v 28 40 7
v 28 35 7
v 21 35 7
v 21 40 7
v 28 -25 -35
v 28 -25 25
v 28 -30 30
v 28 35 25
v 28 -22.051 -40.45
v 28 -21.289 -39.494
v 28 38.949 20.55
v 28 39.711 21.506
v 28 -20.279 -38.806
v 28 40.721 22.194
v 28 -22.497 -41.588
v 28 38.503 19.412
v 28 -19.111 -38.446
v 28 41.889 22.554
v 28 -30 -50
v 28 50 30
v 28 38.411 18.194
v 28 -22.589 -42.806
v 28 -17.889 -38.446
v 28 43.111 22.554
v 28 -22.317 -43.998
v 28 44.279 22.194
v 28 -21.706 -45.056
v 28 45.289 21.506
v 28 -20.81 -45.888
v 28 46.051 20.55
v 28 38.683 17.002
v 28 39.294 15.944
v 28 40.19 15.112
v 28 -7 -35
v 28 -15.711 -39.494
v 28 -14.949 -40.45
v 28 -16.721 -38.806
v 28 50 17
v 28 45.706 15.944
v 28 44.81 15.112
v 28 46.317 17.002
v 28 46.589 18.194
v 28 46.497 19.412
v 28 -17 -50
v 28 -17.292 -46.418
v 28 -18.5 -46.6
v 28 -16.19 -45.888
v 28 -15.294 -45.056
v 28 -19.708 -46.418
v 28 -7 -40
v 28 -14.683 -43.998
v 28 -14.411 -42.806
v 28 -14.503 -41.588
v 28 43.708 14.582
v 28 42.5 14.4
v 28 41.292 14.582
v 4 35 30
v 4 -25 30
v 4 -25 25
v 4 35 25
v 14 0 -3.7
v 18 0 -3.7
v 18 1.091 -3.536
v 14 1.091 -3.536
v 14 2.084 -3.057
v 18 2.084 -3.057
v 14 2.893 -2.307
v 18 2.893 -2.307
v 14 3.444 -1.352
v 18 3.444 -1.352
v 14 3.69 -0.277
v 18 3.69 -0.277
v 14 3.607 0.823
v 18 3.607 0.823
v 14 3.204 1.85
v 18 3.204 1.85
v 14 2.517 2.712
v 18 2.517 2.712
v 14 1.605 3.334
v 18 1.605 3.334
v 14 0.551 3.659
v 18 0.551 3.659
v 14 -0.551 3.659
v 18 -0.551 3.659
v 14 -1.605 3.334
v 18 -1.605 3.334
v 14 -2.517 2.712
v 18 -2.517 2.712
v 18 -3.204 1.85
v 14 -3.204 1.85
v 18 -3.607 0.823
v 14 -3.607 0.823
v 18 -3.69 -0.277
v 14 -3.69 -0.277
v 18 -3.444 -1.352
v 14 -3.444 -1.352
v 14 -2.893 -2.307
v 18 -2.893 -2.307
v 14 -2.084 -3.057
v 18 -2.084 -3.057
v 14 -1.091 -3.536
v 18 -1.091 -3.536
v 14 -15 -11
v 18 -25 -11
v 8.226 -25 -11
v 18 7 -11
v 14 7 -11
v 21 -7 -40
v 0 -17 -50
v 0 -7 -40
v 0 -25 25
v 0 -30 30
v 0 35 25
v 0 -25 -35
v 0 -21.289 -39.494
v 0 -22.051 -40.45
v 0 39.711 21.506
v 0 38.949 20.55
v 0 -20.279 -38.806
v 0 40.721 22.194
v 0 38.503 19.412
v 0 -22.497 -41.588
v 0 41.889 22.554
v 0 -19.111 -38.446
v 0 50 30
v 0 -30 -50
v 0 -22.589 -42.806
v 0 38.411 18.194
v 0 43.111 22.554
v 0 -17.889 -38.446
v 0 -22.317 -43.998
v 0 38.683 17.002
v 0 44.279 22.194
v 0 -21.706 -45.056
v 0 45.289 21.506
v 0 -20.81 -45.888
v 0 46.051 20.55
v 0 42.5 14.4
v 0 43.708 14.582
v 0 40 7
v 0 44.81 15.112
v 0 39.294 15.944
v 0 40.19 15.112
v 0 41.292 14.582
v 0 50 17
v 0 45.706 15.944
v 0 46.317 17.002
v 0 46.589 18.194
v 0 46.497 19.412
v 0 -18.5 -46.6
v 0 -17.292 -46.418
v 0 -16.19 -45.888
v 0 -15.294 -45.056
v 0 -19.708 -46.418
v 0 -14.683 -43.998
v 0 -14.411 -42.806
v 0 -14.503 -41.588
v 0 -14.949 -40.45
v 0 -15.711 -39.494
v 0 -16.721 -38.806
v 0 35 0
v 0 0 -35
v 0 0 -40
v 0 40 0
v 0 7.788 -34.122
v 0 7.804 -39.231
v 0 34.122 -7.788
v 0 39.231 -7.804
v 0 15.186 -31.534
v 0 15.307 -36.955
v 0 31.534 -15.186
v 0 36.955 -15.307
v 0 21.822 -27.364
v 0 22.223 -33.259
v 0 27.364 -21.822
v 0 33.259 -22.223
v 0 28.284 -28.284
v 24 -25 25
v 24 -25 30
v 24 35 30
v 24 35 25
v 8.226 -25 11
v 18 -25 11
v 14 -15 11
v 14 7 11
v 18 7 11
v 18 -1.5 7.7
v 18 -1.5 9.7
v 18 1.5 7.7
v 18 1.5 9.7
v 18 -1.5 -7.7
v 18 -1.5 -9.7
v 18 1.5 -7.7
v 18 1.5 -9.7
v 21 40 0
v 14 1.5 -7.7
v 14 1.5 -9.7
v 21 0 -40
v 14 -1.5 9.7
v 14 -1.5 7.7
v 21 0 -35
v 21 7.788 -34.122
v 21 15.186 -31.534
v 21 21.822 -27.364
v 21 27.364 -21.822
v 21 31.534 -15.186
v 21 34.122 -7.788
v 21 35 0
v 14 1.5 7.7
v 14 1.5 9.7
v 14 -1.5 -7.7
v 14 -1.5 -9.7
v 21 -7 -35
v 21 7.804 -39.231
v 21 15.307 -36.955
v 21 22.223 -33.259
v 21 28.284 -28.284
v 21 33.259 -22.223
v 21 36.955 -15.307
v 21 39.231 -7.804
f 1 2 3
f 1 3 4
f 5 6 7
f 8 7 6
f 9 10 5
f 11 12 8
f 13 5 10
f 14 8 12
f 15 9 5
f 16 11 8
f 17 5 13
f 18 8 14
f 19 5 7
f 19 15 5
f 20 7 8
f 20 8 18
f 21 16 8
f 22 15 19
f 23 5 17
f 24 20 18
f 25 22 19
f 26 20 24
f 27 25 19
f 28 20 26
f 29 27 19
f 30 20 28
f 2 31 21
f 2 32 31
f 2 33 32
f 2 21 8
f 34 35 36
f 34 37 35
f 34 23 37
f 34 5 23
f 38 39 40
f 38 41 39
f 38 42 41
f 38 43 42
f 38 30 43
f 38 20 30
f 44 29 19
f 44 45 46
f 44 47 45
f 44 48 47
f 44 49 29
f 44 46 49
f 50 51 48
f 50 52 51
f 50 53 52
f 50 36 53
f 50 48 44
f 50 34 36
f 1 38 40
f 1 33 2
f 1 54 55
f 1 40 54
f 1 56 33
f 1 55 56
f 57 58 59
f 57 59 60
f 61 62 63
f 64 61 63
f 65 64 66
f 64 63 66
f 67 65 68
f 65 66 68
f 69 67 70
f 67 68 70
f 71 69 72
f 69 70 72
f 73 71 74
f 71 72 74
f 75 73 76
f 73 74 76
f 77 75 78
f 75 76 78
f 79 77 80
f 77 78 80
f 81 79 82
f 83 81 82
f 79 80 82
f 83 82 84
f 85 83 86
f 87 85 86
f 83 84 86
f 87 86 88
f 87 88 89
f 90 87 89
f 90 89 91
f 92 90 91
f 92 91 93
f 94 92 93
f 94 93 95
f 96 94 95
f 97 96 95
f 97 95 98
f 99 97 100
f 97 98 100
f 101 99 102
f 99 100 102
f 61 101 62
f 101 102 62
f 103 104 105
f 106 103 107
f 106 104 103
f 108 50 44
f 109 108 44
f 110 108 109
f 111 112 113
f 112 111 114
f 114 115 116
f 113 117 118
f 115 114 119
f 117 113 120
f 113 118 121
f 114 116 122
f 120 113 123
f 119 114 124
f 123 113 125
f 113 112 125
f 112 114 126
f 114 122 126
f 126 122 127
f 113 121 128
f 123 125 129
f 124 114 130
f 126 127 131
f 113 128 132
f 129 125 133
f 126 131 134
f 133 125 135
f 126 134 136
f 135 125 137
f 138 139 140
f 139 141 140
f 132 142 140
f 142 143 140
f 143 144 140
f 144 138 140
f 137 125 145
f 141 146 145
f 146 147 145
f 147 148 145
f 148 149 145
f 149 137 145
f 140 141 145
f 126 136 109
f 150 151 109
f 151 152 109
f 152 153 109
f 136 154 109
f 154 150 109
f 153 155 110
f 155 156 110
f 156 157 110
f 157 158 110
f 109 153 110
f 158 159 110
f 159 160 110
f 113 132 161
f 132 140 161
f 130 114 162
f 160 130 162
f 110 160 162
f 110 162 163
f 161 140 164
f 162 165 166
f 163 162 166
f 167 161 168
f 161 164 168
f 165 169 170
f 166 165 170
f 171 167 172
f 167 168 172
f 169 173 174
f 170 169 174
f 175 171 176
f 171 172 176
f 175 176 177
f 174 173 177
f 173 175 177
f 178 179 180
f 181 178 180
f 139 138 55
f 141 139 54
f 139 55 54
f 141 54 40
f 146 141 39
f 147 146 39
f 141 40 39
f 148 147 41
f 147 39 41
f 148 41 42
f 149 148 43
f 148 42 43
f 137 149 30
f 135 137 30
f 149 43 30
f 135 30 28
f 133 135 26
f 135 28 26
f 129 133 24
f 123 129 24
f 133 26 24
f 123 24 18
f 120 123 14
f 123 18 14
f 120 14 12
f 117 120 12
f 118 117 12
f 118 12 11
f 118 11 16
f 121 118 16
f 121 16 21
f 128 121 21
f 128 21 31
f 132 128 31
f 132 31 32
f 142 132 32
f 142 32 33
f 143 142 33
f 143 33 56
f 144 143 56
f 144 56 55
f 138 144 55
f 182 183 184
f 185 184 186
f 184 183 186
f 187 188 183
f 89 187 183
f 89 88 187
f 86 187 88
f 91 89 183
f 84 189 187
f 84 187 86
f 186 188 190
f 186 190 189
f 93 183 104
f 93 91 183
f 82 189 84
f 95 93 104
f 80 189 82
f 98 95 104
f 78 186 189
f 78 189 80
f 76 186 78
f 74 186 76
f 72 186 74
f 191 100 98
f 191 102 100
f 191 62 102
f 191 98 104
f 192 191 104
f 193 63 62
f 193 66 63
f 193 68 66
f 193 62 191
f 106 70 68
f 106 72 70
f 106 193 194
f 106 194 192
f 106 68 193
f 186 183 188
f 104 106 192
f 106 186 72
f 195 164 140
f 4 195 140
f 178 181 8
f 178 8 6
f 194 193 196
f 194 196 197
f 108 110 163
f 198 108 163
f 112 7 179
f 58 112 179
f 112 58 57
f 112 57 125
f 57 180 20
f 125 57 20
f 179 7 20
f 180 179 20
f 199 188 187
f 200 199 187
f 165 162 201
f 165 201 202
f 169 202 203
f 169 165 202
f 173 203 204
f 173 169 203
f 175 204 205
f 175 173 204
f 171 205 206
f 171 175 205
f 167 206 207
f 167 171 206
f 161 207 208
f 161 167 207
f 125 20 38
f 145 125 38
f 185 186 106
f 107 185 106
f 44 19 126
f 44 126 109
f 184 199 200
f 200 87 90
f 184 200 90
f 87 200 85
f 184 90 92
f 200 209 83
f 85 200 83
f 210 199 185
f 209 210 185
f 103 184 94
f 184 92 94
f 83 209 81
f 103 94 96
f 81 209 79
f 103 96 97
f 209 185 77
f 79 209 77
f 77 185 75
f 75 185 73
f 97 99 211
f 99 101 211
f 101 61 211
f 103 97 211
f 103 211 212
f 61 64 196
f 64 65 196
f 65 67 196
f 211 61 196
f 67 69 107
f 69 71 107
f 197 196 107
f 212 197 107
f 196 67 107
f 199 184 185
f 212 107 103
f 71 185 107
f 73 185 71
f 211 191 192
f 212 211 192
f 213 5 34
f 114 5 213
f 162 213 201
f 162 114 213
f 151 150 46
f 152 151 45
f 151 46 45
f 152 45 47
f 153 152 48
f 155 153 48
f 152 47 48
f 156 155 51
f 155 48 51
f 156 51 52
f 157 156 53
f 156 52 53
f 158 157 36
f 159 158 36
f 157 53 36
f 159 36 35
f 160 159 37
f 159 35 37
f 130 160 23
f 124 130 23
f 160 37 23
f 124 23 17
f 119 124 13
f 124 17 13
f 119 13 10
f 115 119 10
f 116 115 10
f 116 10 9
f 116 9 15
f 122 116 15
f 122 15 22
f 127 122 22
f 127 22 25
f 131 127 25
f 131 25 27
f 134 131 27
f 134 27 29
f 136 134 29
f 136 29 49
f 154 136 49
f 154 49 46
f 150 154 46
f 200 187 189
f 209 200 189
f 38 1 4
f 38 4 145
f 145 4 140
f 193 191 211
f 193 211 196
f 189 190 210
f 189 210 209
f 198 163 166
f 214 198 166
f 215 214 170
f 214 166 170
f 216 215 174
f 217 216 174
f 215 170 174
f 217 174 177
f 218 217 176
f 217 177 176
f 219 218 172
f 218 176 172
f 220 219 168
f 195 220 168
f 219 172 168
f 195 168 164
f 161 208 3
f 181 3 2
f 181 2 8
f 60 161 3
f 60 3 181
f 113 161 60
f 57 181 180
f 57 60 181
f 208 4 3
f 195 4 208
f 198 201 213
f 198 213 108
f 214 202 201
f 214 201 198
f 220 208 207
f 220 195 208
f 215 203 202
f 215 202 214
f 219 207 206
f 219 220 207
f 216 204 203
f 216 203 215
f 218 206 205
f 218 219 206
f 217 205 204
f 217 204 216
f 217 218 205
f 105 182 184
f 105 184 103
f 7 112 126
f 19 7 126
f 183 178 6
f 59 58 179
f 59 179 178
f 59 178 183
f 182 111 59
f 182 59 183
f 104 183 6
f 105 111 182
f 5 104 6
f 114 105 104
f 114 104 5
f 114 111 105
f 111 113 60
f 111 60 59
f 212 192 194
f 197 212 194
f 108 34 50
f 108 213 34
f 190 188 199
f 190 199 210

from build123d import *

# Parameters (mm, degrees)
BOSS_EXTRUDE1_DEPTH = 28
BOSS_EXTRUDE2_START = -10
SKETCH3_W           = 22
SKETCH3_H           = 32
SKETCH3_R           = 3.7
SKETCH3_W_2         = 2
SKETCH3_H_2         = 3
BOSS_EXTRUDE2_DEPTH = 4
CUT_EXTRUDE1_START  = -7
CUT_EXTRUDE1_DEPTH  = 7
CHAMFER1_SIZE       = 10
CHAMFER1_SIZE2      = 5.773502692
CUT_EXTRUDE2_REACH  = 87.346
SKETCH5_W           = 20
SKETCH5_H           = 60
SKETCH6_W           = 23
SKETCH6_H           = 10
SKETCH6_W_2         = 10
SKETCH6_H_2         = 23
BOSS_EXTRUDE3_DEPTH = 28
SKETCH8_R           = 4.1
CUT_EXTRUDE3_DEPTH  = 77.052613367
CHAMFER2_SIZE       = 10


with BuildPart() as part:
    # Sketch2 → Boss-Extrude1 (new body)
    with BuildSketch(Plane(origin=(0, 0, 0), x_dir=(0, 0, -1), z_dir=(1, 0, 0))):
        with BuildLine():
            Line((0, 40), (-30, 40))
            Line((-30, 40), (-30, -30))
            Line((-30, -30), (40, -30))
            Line((40, -30), (40, 0))
            ThreePointArc((40, 0), (28.284271247, 28.284271247), (0, 40))
        make_face()
        with BuildLine():
            Line((-25, 35), (-25, -25))
            Line((-25, -25), (35, -25))
            Line((35, -25), (35, 0))
            ThreePointArc((35, 0), (24.748737342, 24.748737342), (0, 35))
            Line((0, 35), (-25, 35))
        make_face(mode=Mode.SUBTRACT)
    extrude(amount=BOSS_EXTRUDE1_DEPTH)

    # Sketch3 → Boss-Extrude2 (add)
    with BuildSketch(Plane(origin=(28, 0, 0), x_dir=(0, 0, -1), z_dir=(1, 0, 0)).offset(BOSS_EXTRUDE2_START)):
        with Locations((0, -9)):
            Rectangle(SKETCH3_W, SKETCH3_H)
        Circle(SKETCH3_R, mode=Mode.SUBTRACT)
        with Locations((-8.7, 0)):
            Rectangle(SKETCH3_W_2, SKETCH3_H_2, mode=Mode.SUBTRACT)
        with Locations((8.7, 0)):
            Rectangle(SKETCH3_W_2, SKETCH3_H_2, mode=Mode.SUBTRACT)
    extrude(amount=-BOSS_EXTRUDE2_DEPTH)

    # Sketch4 → Cut-Extrude1 (cut)
    with BuildSketch(Plane(origin=(28, 0, 0), x_dir=(0, 0, -1), z_dir=(1, 0, 0)).offset(CUT_EXTRUDE1_START)):
        with BuildLine():
            Line((0, 40), (-7, 40))
            Line((-7, 40), (-7, 35))
            Line((-7, 35), (0, 35))
            ThreePointArc((0, 35), (24.748737342, 24.748737342), (35, 0))
            Line((35, 0), (35, -7))
            Line((35, -7), (40, -7))
            Line((40, -7), (40, 0))
            ThreePointArc((40, 0), (28.284271247, 28.284271247), (0, 40))
        make_face()
    extrude(amount=CUT_EXTRUDE1_DEPTH, mode=Mode.SUBTRACT)

    # Chamfer1
    chamfer1_edges = [part.edges().sort_by_distance(p)[0] for p in [
        (14, -25, 0),
    ]]
    chamfer1_side = [part.faces().sort_by_distance(p)[0] for p in [
        (14, -9.762838276, 0),
    ]]
    chamfer(chamfer1_edges, length=CHAMFER1_SIZE, length2=CHAMFER1_SIZE2, reference=chamfer1_side[0])

    # Sketch5 → Cut-Extrude2 (cut, up to next)
    with BuildSketch(Plane.XY.offset(30), mode=Mode.PRIVATE) as cut_extrude2_sk1:
        with Locations((14, 5)):
            Rectangle(SKETCH5_W, SKETCH5_H)
    cut_extrude2_tool1 = extrude(cut_extrude2_sk1.sketch, amount=-CUT_EXTRUDE2_REACH, mode=Mode.PRIVATE) & part.part
    add(cut_extrude2_tool1.solids().sort_by_distance((14, 5, 30))[0], mode=Mode.SUBTRACT)

    # Sketch6 → Boss-Extrude3 (add)
    with BuildSketch(Plane(origin=(28, 0, 0), x_dir=(0, 0, -1), z_dir=(1, 0, 0))):
        with Locations((-18.5, 45)):
            Rectangle(SKETCH6_W, SKETCH6_H)
        with Locations((45, -18.5)):
            Rectangle(SKETCH6_W_2, SKETCH6_H_2)
    extrude(amount=-BOSS_EXTRUDE3_DEPTH)

    # Sketch8 → Cut-Extrude3 (cut, through all)
    with BuildSketch(Plane(origin=(28, 0, 0), x_dir=(0, 0, -1), z_dir=(1, 0, 0))):
        with Locations((-18.5, 42.5)):
            Circle(SKETCH8_R)
        with Locations((42.5, -18.5)):
            Circle(SKETCH8_R)
    extrude(amount=-CUT_EXTRUDE3_DEPTH, mode=Mode.SUBTRACT)

    # Chamfer2
    chamfer2_edges = [part.edges().sort_by_distance(p)[0] for p in [
        (14, -7, -50),
        (14, 50, 7),
    ]]
    chamfer(chamfer2_edges, length=CHAMFER2_SIZE)


solid = part.part
